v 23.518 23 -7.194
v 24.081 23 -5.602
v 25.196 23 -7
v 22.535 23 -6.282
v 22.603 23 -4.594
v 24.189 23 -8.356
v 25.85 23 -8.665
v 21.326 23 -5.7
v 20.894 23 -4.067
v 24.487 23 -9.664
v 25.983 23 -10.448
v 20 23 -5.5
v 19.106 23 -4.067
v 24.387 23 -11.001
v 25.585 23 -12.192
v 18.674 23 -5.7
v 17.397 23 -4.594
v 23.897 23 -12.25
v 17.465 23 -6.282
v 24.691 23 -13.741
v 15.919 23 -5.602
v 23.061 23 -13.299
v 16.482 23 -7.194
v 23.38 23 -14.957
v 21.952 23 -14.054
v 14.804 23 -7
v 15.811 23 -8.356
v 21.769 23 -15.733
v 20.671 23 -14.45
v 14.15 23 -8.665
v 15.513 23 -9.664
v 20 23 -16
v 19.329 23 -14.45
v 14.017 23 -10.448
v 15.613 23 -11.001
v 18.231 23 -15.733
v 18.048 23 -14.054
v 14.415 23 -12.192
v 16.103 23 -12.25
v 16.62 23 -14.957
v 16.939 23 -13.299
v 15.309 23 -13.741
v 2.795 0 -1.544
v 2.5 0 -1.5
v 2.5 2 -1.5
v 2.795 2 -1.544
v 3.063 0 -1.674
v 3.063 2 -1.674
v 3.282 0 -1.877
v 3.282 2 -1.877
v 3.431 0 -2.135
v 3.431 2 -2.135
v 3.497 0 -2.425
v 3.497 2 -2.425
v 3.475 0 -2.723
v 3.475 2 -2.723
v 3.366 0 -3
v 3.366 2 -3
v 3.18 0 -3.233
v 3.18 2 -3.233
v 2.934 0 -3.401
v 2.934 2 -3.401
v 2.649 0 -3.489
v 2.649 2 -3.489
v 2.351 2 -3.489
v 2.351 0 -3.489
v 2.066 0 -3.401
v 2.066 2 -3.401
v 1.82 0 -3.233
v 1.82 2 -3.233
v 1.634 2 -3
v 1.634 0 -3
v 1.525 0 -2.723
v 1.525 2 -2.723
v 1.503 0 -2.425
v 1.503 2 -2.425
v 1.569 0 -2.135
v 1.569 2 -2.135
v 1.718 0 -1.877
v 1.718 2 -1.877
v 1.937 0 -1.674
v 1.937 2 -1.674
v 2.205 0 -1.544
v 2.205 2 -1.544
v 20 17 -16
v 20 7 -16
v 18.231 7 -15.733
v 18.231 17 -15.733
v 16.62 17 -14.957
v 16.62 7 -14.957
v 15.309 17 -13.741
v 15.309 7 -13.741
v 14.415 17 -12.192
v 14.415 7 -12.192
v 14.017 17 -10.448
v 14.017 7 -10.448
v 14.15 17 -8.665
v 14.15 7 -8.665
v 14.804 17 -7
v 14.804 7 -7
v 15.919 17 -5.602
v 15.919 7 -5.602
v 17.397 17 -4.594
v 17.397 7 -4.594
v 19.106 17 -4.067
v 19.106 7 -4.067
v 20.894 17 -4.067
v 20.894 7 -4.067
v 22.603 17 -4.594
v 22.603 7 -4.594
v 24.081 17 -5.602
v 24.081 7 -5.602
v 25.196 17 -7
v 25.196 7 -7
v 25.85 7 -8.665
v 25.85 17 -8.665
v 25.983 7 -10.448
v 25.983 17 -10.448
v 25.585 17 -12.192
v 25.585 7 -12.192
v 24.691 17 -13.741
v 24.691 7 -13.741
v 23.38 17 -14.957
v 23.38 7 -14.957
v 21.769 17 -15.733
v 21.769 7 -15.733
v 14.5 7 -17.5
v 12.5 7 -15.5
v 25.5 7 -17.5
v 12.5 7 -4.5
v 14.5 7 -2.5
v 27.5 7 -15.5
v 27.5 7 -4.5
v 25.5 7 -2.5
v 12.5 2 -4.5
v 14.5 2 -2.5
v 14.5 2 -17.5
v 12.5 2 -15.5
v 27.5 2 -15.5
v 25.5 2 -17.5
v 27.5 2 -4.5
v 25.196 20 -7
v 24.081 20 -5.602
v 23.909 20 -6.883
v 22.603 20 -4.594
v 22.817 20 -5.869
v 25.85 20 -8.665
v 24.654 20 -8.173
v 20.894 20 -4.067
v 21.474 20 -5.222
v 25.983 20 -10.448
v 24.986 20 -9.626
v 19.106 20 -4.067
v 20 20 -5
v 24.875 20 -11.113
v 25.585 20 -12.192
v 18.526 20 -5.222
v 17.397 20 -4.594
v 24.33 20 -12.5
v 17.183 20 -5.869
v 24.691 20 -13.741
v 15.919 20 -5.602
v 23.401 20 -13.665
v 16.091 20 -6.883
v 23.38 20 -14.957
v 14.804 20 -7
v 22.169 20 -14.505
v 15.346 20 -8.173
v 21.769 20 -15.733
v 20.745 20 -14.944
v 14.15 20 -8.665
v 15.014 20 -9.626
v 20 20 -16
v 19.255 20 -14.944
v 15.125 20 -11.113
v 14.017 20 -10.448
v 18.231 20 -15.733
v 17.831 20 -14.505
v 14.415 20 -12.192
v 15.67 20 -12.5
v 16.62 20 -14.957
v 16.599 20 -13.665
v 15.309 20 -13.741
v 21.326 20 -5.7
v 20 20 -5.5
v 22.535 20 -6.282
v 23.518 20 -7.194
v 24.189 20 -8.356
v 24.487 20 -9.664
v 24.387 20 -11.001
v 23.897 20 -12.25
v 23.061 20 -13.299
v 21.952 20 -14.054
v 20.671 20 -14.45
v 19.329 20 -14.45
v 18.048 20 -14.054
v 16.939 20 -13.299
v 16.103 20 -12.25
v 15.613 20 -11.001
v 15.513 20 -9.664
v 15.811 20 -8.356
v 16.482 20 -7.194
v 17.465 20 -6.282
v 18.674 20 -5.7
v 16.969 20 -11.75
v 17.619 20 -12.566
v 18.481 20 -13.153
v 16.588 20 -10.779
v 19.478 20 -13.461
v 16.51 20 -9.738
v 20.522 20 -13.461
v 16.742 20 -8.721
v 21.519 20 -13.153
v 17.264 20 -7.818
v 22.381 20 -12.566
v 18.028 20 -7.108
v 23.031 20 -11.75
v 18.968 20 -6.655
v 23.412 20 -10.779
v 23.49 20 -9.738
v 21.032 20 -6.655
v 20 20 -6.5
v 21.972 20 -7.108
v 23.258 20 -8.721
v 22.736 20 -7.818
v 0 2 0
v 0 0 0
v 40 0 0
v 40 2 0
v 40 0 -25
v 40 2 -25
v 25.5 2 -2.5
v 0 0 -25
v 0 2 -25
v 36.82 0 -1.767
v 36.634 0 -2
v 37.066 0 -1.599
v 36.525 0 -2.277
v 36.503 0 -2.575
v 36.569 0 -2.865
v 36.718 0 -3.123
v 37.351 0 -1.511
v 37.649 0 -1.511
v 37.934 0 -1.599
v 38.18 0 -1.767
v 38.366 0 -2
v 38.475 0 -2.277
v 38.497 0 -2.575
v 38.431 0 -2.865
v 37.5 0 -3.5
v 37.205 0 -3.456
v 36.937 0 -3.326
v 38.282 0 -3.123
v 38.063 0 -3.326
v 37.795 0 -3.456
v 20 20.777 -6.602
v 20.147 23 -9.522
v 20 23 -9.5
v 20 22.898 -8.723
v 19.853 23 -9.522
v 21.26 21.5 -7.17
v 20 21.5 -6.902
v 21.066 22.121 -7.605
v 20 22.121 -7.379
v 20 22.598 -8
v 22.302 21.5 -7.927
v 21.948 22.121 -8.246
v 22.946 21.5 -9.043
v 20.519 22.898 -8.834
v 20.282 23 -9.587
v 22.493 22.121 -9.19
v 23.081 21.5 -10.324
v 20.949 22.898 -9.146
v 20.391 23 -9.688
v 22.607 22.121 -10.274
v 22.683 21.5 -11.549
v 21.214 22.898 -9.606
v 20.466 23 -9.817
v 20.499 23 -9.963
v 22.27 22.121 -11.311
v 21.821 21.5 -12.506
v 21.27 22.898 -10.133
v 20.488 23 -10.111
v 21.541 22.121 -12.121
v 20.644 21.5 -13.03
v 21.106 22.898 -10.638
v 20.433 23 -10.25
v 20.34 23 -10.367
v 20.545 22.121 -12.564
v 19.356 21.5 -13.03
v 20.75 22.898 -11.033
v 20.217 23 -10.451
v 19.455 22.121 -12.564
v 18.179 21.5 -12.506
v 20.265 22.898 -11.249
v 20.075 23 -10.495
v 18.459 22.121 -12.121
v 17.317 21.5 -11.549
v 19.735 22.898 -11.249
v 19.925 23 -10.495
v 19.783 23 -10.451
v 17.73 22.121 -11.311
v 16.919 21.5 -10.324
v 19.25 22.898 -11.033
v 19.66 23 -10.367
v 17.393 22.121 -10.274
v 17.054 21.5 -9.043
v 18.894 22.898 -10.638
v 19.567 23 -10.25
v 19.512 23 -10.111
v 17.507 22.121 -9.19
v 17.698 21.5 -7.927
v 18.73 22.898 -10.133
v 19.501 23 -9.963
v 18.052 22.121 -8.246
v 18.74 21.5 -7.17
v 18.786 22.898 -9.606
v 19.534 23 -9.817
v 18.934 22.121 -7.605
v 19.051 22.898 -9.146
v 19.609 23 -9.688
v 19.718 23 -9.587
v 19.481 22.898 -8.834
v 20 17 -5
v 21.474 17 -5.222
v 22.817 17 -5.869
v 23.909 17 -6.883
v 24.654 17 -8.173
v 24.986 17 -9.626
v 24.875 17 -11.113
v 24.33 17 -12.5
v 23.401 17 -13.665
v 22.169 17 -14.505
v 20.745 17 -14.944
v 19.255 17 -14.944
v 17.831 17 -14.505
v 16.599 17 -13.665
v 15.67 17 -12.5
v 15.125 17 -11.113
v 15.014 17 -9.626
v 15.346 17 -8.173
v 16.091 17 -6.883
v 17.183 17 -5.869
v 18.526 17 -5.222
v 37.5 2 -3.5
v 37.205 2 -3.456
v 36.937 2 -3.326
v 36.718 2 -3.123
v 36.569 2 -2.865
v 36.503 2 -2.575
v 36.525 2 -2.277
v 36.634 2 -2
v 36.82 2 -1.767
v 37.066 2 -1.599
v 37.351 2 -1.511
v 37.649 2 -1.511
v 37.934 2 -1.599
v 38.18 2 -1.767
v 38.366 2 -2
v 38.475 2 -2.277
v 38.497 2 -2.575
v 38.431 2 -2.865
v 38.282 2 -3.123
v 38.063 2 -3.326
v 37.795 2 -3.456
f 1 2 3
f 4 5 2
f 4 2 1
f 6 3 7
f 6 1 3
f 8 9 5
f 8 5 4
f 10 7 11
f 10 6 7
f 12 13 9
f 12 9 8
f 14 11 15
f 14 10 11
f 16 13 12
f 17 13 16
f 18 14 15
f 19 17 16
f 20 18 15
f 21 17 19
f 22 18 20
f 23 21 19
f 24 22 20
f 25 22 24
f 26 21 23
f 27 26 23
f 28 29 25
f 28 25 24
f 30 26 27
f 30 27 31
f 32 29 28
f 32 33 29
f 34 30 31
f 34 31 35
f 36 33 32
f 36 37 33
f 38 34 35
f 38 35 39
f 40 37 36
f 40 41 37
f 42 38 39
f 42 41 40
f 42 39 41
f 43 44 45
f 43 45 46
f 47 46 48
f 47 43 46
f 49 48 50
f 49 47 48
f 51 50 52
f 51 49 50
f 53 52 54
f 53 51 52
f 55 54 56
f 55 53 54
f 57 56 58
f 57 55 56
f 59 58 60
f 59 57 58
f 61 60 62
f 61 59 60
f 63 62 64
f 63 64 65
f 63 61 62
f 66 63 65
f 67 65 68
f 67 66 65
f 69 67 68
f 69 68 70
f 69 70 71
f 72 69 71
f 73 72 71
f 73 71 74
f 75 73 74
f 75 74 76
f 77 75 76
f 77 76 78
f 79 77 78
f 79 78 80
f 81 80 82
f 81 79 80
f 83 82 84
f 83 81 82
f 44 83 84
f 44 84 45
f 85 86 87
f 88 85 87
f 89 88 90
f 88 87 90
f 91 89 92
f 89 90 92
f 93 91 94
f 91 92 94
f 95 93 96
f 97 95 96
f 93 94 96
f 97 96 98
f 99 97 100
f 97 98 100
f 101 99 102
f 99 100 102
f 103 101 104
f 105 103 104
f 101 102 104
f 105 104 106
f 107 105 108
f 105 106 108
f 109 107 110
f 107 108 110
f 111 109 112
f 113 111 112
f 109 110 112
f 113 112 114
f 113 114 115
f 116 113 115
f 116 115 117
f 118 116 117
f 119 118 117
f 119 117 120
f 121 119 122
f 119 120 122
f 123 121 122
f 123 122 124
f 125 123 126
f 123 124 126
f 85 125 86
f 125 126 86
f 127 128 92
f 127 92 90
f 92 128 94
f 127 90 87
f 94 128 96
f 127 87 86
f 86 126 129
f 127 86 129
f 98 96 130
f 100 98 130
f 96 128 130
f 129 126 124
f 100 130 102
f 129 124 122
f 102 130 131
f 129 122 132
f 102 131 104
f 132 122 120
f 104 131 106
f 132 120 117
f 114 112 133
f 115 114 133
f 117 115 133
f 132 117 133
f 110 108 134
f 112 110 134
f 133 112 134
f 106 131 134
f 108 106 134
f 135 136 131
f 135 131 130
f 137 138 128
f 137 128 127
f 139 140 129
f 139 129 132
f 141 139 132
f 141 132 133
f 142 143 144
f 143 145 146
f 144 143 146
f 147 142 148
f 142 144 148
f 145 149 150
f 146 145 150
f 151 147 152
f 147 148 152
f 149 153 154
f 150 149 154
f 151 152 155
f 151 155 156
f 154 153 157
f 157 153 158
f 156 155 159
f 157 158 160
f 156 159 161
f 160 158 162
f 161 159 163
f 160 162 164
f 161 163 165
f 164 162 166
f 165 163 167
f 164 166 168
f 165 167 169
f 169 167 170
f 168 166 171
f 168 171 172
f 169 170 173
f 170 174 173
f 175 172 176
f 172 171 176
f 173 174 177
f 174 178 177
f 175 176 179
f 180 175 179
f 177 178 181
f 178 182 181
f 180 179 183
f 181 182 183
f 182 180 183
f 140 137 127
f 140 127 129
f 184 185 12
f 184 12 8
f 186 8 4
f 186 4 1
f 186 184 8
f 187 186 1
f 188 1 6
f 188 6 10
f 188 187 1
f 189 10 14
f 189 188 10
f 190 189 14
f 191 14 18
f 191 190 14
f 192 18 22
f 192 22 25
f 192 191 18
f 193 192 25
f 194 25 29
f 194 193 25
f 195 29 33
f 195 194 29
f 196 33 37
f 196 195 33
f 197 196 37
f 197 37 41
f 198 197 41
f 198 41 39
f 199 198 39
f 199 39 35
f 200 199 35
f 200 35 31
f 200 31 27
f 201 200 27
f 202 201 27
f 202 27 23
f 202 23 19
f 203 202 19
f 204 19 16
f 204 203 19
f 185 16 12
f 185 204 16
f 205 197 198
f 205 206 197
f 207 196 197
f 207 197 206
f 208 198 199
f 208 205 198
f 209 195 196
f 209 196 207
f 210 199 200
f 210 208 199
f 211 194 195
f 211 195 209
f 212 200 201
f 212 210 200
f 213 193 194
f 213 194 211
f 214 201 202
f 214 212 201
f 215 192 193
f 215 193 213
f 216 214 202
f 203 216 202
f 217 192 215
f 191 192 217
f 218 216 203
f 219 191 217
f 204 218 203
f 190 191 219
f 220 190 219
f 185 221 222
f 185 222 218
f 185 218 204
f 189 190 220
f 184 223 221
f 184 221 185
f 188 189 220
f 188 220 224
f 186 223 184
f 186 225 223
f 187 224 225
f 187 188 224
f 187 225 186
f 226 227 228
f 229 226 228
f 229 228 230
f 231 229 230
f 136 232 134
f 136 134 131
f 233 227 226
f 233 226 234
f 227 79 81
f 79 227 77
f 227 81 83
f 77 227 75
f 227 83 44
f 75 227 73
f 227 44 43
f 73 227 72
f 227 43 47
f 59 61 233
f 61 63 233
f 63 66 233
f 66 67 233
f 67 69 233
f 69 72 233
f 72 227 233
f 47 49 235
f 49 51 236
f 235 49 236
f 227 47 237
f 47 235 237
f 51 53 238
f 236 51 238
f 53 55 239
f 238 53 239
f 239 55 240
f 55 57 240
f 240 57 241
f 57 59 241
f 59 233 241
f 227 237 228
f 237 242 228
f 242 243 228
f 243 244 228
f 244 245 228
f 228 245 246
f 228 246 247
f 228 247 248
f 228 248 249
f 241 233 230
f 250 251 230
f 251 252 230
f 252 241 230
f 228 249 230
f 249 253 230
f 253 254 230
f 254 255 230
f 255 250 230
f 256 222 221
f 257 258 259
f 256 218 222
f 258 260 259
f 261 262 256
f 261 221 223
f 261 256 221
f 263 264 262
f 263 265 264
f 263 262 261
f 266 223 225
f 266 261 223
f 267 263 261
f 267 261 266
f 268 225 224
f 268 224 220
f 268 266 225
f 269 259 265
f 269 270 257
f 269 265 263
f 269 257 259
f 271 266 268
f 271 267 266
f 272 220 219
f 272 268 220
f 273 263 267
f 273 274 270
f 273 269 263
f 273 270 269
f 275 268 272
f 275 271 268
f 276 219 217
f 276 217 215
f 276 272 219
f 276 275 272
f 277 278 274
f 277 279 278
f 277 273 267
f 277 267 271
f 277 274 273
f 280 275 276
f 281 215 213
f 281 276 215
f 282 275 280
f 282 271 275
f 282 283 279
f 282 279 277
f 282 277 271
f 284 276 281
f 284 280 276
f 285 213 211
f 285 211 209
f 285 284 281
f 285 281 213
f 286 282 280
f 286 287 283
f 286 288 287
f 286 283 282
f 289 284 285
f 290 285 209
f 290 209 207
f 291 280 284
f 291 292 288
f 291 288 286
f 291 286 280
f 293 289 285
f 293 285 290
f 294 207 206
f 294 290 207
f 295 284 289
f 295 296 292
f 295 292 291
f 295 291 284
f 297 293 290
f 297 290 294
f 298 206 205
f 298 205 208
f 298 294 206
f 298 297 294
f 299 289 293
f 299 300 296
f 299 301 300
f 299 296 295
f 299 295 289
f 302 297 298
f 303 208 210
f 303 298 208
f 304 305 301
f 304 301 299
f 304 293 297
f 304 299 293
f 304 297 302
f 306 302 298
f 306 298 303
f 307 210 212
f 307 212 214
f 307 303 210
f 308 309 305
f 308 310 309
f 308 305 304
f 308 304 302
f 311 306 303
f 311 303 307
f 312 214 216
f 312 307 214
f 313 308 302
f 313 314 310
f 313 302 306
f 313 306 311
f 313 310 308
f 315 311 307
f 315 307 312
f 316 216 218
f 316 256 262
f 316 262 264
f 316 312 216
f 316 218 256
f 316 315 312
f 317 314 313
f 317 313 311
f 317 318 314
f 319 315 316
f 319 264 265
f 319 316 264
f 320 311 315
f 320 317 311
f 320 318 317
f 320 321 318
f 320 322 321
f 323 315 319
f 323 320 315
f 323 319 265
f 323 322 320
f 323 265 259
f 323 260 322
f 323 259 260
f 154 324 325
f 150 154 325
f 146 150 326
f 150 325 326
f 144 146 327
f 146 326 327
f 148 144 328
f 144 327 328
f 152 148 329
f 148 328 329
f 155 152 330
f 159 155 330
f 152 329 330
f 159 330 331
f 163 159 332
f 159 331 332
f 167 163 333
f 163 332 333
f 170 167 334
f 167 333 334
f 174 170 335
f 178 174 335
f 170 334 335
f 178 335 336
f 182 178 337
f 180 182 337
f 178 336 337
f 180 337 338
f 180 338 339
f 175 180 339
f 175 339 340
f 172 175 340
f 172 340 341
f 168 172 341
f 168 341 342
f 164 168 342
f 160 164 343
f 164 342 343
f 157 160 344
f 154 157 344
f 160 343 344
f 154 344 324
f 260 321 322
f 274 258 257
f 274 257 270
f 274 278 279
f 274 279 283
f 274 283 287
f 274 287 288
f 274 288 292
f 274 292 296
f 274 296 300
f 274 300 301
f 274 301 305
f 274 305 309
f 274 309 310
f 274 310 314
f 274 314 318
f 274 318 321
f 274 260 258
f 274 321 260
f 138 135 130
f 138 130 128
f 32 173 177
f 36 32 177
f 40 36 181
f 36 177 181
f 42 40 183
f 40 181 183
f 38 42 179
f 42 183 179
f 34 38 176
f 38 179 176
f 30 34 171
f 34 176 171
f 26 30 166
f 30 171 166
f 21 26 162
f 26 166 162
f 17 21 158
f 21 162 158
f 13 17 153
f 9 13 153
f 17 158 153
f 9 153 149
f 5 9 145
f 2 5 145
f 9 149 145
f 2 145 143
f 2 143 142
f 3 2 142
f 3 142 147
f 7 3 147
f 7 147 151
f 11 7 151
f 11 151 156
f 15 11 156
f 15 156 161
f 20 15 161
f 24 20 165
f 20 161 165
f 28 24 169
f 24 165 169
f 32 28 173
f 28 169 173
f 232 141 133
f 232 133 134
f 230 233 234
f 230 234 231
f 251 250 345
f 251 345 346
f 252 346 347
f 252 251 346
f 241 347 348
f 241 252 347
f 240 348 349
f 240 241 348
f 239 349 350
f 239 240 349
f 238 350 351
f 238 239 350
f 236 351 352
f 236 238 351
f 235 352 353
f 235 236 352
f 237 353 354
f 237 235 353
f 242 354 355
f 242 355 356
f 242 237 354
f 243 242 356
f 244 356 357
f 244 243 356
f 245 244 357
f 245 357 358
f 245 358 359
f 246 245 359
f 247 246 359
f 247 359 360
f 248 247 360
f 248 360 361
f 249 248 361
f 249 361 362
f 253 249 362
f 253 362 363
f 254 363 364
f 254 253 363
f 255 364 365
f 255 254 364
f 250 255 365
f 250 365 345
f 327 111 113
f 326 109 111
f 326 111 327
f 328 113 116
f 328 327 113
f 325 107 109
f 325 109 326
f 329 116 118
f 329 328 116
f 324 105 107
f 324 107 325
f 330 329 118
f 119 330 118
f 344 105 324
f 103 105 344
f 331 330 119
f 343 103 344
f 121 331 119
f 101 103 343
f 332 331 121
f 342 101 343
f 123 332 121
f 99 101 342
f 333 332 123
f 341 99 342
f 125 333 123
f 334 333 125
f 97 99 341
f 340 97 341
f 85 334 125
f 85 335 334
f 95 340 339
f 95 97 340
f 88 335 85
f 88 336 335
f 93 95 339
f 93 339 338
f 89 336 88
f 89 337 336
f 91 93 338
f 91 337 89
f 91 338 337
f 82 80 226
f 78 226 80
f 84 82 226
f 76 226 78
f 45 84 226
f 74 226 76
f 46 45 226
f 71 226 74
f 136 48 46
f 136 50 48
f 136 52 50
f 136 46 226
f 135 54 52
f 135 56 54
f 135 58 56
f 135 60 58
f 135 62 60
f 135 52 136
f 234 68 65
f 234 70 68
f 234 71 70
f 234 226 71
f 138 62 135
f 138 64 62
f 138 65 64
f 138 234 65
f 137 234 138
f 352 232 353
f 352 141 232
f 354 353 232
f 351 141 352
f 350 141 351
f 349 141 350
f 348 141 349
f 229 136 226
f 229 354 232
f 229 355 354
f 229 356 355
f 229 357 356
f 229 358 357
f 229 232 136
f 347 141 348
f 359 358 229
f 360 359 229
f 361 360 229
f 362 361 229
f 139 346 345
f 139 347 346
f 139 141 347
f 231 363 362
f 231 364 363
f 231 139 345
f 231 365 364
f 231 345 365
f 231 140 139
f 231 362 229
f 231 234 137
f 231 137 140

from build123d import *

# Parameters (mm, degrees)
ESQUISSE1_W      = 40
ESQUISSE1_H      = 25
ESQUISSE1_R      = 1
EXTRUSION1_DEPTH = 2
EXTRUSION2_DEPTH = 5
ESQUISSE3_R      = 6
EXTRUSION3_DEPTH = 10
ESQUISSE4_R      = 5
EXTRUSION4_DEPTH = 3
ESQUISSE5_R      = 6
ESQUISSE5_R_2    = 4.5
EXTRUSION5_DEPTH = 3
ESQUISSE6_R      = 3.5
EXTRUSION6_DEPTH = 3
CONG_1_R         = 3


with BuildPart() as part:
    # Esquisse1 → Extrusion1 (new body)
    with BuildSketch(Plane(origin=(0, 0, 0), x_dir=(1, 0, 0), z_dir=(0, 1, 0))):
        with Locations((20, 12.5)):
            Rectangle(ESQUISSE1_W, ESQUISSE1_H)
        with Locations(Location((2.5, 2.5, 0), (0, 0, 270))):
            Circle(ESQUISSE1_R, mode=Mode.SUBTRACT)
        with Locations(Location((37.5, 2.5, 0), (0, 0, 90))):
            Circle(ESQUISSE1_R, mode=Mode.SUBTRACT)
    extrude(amount=EXTRUSION1_DEPTH)

    # Esquisse2 → Extrusion2 (add)
    with BuildSketch(Plane(origin=(0, 2, 0), x_dir=(-1, 0, 0), z_dir=(0, 1, 0))):
        Polygon((-14.5, -17.5), (-25.5, -17.5), (-27.5, -15.5), (-27.5, -4.5), (-25.5, -2.5), (-14.5, -2.5), (-12.5, -4.5), (-12.5, -15.5), align=None)
    extrude(amount=EXTRUSION2_DEPTH)

    # Esquisse3 → Extrusion3 (add)
    with BuildSketch(Plane(origin=(0, 7, 0), x_dir=(1, 0, 0), z_dir=(0, 1, 0))):
        with Locations(Location((20, 10, 0), (0, 0, 90))):
            Circle(ESQUISSE3_R)
    extrude(amount=EXTRUSION3_DEPTH)

    # Esquisse4 → Extrusion4 (add)
    with BuildSketch(Plane(origin=(0, 17, 0), x_dir=(1, 0, 0), z_dir=(0, 1, 0))):
        with Locations(Location((20, 10, 0), (0, 0, 270))):
            Circle(ESQUISSE4_R)
    extrude(amount=EXTRUSION4_DEPTH)

    # Esquisse5 → Extrusion5 (add)
    with BuildSketch(Plane(origin=(0, 20, 0), x_dir=(1, 0, 0), z_dir=(0, 1, 0))):
        with Locations(Location((20, 10, 0), (0, 0, 90))):
            Circle(ESQUISSE5_R)
        with Locations(Location((20, 10, 0), (0, 0, 270))):
            Circle(ESQUISSE5_R_2, mode=Mode.SUBTRACT)
    extrude(amount=EXTRUSION5_DEPTH)

    # Esquisse6 → Extrusion6 (add)
    with BuildSketch(Plane(origin=(0, 20, 0), x_dir=(1, 0, 0), z_dir=(0, 1, 0))):
        with Locations(Location((20, 10, 0), (0, 0, 270))):
            Circle(ESQUISSE6_R)
    extrude(amount=EXTRUSION6_DEPTH)

    # Congé1
    cong_1_edges = [part.edges().sort_by_distance(p)[0] for p in [
        (20, 23, -13.5),
    ]]
    fillet(cong_1_edges, radius=CONG_1_R - 0.0001)  # a hair under: the kernel refuses the full size


solid = part.part
